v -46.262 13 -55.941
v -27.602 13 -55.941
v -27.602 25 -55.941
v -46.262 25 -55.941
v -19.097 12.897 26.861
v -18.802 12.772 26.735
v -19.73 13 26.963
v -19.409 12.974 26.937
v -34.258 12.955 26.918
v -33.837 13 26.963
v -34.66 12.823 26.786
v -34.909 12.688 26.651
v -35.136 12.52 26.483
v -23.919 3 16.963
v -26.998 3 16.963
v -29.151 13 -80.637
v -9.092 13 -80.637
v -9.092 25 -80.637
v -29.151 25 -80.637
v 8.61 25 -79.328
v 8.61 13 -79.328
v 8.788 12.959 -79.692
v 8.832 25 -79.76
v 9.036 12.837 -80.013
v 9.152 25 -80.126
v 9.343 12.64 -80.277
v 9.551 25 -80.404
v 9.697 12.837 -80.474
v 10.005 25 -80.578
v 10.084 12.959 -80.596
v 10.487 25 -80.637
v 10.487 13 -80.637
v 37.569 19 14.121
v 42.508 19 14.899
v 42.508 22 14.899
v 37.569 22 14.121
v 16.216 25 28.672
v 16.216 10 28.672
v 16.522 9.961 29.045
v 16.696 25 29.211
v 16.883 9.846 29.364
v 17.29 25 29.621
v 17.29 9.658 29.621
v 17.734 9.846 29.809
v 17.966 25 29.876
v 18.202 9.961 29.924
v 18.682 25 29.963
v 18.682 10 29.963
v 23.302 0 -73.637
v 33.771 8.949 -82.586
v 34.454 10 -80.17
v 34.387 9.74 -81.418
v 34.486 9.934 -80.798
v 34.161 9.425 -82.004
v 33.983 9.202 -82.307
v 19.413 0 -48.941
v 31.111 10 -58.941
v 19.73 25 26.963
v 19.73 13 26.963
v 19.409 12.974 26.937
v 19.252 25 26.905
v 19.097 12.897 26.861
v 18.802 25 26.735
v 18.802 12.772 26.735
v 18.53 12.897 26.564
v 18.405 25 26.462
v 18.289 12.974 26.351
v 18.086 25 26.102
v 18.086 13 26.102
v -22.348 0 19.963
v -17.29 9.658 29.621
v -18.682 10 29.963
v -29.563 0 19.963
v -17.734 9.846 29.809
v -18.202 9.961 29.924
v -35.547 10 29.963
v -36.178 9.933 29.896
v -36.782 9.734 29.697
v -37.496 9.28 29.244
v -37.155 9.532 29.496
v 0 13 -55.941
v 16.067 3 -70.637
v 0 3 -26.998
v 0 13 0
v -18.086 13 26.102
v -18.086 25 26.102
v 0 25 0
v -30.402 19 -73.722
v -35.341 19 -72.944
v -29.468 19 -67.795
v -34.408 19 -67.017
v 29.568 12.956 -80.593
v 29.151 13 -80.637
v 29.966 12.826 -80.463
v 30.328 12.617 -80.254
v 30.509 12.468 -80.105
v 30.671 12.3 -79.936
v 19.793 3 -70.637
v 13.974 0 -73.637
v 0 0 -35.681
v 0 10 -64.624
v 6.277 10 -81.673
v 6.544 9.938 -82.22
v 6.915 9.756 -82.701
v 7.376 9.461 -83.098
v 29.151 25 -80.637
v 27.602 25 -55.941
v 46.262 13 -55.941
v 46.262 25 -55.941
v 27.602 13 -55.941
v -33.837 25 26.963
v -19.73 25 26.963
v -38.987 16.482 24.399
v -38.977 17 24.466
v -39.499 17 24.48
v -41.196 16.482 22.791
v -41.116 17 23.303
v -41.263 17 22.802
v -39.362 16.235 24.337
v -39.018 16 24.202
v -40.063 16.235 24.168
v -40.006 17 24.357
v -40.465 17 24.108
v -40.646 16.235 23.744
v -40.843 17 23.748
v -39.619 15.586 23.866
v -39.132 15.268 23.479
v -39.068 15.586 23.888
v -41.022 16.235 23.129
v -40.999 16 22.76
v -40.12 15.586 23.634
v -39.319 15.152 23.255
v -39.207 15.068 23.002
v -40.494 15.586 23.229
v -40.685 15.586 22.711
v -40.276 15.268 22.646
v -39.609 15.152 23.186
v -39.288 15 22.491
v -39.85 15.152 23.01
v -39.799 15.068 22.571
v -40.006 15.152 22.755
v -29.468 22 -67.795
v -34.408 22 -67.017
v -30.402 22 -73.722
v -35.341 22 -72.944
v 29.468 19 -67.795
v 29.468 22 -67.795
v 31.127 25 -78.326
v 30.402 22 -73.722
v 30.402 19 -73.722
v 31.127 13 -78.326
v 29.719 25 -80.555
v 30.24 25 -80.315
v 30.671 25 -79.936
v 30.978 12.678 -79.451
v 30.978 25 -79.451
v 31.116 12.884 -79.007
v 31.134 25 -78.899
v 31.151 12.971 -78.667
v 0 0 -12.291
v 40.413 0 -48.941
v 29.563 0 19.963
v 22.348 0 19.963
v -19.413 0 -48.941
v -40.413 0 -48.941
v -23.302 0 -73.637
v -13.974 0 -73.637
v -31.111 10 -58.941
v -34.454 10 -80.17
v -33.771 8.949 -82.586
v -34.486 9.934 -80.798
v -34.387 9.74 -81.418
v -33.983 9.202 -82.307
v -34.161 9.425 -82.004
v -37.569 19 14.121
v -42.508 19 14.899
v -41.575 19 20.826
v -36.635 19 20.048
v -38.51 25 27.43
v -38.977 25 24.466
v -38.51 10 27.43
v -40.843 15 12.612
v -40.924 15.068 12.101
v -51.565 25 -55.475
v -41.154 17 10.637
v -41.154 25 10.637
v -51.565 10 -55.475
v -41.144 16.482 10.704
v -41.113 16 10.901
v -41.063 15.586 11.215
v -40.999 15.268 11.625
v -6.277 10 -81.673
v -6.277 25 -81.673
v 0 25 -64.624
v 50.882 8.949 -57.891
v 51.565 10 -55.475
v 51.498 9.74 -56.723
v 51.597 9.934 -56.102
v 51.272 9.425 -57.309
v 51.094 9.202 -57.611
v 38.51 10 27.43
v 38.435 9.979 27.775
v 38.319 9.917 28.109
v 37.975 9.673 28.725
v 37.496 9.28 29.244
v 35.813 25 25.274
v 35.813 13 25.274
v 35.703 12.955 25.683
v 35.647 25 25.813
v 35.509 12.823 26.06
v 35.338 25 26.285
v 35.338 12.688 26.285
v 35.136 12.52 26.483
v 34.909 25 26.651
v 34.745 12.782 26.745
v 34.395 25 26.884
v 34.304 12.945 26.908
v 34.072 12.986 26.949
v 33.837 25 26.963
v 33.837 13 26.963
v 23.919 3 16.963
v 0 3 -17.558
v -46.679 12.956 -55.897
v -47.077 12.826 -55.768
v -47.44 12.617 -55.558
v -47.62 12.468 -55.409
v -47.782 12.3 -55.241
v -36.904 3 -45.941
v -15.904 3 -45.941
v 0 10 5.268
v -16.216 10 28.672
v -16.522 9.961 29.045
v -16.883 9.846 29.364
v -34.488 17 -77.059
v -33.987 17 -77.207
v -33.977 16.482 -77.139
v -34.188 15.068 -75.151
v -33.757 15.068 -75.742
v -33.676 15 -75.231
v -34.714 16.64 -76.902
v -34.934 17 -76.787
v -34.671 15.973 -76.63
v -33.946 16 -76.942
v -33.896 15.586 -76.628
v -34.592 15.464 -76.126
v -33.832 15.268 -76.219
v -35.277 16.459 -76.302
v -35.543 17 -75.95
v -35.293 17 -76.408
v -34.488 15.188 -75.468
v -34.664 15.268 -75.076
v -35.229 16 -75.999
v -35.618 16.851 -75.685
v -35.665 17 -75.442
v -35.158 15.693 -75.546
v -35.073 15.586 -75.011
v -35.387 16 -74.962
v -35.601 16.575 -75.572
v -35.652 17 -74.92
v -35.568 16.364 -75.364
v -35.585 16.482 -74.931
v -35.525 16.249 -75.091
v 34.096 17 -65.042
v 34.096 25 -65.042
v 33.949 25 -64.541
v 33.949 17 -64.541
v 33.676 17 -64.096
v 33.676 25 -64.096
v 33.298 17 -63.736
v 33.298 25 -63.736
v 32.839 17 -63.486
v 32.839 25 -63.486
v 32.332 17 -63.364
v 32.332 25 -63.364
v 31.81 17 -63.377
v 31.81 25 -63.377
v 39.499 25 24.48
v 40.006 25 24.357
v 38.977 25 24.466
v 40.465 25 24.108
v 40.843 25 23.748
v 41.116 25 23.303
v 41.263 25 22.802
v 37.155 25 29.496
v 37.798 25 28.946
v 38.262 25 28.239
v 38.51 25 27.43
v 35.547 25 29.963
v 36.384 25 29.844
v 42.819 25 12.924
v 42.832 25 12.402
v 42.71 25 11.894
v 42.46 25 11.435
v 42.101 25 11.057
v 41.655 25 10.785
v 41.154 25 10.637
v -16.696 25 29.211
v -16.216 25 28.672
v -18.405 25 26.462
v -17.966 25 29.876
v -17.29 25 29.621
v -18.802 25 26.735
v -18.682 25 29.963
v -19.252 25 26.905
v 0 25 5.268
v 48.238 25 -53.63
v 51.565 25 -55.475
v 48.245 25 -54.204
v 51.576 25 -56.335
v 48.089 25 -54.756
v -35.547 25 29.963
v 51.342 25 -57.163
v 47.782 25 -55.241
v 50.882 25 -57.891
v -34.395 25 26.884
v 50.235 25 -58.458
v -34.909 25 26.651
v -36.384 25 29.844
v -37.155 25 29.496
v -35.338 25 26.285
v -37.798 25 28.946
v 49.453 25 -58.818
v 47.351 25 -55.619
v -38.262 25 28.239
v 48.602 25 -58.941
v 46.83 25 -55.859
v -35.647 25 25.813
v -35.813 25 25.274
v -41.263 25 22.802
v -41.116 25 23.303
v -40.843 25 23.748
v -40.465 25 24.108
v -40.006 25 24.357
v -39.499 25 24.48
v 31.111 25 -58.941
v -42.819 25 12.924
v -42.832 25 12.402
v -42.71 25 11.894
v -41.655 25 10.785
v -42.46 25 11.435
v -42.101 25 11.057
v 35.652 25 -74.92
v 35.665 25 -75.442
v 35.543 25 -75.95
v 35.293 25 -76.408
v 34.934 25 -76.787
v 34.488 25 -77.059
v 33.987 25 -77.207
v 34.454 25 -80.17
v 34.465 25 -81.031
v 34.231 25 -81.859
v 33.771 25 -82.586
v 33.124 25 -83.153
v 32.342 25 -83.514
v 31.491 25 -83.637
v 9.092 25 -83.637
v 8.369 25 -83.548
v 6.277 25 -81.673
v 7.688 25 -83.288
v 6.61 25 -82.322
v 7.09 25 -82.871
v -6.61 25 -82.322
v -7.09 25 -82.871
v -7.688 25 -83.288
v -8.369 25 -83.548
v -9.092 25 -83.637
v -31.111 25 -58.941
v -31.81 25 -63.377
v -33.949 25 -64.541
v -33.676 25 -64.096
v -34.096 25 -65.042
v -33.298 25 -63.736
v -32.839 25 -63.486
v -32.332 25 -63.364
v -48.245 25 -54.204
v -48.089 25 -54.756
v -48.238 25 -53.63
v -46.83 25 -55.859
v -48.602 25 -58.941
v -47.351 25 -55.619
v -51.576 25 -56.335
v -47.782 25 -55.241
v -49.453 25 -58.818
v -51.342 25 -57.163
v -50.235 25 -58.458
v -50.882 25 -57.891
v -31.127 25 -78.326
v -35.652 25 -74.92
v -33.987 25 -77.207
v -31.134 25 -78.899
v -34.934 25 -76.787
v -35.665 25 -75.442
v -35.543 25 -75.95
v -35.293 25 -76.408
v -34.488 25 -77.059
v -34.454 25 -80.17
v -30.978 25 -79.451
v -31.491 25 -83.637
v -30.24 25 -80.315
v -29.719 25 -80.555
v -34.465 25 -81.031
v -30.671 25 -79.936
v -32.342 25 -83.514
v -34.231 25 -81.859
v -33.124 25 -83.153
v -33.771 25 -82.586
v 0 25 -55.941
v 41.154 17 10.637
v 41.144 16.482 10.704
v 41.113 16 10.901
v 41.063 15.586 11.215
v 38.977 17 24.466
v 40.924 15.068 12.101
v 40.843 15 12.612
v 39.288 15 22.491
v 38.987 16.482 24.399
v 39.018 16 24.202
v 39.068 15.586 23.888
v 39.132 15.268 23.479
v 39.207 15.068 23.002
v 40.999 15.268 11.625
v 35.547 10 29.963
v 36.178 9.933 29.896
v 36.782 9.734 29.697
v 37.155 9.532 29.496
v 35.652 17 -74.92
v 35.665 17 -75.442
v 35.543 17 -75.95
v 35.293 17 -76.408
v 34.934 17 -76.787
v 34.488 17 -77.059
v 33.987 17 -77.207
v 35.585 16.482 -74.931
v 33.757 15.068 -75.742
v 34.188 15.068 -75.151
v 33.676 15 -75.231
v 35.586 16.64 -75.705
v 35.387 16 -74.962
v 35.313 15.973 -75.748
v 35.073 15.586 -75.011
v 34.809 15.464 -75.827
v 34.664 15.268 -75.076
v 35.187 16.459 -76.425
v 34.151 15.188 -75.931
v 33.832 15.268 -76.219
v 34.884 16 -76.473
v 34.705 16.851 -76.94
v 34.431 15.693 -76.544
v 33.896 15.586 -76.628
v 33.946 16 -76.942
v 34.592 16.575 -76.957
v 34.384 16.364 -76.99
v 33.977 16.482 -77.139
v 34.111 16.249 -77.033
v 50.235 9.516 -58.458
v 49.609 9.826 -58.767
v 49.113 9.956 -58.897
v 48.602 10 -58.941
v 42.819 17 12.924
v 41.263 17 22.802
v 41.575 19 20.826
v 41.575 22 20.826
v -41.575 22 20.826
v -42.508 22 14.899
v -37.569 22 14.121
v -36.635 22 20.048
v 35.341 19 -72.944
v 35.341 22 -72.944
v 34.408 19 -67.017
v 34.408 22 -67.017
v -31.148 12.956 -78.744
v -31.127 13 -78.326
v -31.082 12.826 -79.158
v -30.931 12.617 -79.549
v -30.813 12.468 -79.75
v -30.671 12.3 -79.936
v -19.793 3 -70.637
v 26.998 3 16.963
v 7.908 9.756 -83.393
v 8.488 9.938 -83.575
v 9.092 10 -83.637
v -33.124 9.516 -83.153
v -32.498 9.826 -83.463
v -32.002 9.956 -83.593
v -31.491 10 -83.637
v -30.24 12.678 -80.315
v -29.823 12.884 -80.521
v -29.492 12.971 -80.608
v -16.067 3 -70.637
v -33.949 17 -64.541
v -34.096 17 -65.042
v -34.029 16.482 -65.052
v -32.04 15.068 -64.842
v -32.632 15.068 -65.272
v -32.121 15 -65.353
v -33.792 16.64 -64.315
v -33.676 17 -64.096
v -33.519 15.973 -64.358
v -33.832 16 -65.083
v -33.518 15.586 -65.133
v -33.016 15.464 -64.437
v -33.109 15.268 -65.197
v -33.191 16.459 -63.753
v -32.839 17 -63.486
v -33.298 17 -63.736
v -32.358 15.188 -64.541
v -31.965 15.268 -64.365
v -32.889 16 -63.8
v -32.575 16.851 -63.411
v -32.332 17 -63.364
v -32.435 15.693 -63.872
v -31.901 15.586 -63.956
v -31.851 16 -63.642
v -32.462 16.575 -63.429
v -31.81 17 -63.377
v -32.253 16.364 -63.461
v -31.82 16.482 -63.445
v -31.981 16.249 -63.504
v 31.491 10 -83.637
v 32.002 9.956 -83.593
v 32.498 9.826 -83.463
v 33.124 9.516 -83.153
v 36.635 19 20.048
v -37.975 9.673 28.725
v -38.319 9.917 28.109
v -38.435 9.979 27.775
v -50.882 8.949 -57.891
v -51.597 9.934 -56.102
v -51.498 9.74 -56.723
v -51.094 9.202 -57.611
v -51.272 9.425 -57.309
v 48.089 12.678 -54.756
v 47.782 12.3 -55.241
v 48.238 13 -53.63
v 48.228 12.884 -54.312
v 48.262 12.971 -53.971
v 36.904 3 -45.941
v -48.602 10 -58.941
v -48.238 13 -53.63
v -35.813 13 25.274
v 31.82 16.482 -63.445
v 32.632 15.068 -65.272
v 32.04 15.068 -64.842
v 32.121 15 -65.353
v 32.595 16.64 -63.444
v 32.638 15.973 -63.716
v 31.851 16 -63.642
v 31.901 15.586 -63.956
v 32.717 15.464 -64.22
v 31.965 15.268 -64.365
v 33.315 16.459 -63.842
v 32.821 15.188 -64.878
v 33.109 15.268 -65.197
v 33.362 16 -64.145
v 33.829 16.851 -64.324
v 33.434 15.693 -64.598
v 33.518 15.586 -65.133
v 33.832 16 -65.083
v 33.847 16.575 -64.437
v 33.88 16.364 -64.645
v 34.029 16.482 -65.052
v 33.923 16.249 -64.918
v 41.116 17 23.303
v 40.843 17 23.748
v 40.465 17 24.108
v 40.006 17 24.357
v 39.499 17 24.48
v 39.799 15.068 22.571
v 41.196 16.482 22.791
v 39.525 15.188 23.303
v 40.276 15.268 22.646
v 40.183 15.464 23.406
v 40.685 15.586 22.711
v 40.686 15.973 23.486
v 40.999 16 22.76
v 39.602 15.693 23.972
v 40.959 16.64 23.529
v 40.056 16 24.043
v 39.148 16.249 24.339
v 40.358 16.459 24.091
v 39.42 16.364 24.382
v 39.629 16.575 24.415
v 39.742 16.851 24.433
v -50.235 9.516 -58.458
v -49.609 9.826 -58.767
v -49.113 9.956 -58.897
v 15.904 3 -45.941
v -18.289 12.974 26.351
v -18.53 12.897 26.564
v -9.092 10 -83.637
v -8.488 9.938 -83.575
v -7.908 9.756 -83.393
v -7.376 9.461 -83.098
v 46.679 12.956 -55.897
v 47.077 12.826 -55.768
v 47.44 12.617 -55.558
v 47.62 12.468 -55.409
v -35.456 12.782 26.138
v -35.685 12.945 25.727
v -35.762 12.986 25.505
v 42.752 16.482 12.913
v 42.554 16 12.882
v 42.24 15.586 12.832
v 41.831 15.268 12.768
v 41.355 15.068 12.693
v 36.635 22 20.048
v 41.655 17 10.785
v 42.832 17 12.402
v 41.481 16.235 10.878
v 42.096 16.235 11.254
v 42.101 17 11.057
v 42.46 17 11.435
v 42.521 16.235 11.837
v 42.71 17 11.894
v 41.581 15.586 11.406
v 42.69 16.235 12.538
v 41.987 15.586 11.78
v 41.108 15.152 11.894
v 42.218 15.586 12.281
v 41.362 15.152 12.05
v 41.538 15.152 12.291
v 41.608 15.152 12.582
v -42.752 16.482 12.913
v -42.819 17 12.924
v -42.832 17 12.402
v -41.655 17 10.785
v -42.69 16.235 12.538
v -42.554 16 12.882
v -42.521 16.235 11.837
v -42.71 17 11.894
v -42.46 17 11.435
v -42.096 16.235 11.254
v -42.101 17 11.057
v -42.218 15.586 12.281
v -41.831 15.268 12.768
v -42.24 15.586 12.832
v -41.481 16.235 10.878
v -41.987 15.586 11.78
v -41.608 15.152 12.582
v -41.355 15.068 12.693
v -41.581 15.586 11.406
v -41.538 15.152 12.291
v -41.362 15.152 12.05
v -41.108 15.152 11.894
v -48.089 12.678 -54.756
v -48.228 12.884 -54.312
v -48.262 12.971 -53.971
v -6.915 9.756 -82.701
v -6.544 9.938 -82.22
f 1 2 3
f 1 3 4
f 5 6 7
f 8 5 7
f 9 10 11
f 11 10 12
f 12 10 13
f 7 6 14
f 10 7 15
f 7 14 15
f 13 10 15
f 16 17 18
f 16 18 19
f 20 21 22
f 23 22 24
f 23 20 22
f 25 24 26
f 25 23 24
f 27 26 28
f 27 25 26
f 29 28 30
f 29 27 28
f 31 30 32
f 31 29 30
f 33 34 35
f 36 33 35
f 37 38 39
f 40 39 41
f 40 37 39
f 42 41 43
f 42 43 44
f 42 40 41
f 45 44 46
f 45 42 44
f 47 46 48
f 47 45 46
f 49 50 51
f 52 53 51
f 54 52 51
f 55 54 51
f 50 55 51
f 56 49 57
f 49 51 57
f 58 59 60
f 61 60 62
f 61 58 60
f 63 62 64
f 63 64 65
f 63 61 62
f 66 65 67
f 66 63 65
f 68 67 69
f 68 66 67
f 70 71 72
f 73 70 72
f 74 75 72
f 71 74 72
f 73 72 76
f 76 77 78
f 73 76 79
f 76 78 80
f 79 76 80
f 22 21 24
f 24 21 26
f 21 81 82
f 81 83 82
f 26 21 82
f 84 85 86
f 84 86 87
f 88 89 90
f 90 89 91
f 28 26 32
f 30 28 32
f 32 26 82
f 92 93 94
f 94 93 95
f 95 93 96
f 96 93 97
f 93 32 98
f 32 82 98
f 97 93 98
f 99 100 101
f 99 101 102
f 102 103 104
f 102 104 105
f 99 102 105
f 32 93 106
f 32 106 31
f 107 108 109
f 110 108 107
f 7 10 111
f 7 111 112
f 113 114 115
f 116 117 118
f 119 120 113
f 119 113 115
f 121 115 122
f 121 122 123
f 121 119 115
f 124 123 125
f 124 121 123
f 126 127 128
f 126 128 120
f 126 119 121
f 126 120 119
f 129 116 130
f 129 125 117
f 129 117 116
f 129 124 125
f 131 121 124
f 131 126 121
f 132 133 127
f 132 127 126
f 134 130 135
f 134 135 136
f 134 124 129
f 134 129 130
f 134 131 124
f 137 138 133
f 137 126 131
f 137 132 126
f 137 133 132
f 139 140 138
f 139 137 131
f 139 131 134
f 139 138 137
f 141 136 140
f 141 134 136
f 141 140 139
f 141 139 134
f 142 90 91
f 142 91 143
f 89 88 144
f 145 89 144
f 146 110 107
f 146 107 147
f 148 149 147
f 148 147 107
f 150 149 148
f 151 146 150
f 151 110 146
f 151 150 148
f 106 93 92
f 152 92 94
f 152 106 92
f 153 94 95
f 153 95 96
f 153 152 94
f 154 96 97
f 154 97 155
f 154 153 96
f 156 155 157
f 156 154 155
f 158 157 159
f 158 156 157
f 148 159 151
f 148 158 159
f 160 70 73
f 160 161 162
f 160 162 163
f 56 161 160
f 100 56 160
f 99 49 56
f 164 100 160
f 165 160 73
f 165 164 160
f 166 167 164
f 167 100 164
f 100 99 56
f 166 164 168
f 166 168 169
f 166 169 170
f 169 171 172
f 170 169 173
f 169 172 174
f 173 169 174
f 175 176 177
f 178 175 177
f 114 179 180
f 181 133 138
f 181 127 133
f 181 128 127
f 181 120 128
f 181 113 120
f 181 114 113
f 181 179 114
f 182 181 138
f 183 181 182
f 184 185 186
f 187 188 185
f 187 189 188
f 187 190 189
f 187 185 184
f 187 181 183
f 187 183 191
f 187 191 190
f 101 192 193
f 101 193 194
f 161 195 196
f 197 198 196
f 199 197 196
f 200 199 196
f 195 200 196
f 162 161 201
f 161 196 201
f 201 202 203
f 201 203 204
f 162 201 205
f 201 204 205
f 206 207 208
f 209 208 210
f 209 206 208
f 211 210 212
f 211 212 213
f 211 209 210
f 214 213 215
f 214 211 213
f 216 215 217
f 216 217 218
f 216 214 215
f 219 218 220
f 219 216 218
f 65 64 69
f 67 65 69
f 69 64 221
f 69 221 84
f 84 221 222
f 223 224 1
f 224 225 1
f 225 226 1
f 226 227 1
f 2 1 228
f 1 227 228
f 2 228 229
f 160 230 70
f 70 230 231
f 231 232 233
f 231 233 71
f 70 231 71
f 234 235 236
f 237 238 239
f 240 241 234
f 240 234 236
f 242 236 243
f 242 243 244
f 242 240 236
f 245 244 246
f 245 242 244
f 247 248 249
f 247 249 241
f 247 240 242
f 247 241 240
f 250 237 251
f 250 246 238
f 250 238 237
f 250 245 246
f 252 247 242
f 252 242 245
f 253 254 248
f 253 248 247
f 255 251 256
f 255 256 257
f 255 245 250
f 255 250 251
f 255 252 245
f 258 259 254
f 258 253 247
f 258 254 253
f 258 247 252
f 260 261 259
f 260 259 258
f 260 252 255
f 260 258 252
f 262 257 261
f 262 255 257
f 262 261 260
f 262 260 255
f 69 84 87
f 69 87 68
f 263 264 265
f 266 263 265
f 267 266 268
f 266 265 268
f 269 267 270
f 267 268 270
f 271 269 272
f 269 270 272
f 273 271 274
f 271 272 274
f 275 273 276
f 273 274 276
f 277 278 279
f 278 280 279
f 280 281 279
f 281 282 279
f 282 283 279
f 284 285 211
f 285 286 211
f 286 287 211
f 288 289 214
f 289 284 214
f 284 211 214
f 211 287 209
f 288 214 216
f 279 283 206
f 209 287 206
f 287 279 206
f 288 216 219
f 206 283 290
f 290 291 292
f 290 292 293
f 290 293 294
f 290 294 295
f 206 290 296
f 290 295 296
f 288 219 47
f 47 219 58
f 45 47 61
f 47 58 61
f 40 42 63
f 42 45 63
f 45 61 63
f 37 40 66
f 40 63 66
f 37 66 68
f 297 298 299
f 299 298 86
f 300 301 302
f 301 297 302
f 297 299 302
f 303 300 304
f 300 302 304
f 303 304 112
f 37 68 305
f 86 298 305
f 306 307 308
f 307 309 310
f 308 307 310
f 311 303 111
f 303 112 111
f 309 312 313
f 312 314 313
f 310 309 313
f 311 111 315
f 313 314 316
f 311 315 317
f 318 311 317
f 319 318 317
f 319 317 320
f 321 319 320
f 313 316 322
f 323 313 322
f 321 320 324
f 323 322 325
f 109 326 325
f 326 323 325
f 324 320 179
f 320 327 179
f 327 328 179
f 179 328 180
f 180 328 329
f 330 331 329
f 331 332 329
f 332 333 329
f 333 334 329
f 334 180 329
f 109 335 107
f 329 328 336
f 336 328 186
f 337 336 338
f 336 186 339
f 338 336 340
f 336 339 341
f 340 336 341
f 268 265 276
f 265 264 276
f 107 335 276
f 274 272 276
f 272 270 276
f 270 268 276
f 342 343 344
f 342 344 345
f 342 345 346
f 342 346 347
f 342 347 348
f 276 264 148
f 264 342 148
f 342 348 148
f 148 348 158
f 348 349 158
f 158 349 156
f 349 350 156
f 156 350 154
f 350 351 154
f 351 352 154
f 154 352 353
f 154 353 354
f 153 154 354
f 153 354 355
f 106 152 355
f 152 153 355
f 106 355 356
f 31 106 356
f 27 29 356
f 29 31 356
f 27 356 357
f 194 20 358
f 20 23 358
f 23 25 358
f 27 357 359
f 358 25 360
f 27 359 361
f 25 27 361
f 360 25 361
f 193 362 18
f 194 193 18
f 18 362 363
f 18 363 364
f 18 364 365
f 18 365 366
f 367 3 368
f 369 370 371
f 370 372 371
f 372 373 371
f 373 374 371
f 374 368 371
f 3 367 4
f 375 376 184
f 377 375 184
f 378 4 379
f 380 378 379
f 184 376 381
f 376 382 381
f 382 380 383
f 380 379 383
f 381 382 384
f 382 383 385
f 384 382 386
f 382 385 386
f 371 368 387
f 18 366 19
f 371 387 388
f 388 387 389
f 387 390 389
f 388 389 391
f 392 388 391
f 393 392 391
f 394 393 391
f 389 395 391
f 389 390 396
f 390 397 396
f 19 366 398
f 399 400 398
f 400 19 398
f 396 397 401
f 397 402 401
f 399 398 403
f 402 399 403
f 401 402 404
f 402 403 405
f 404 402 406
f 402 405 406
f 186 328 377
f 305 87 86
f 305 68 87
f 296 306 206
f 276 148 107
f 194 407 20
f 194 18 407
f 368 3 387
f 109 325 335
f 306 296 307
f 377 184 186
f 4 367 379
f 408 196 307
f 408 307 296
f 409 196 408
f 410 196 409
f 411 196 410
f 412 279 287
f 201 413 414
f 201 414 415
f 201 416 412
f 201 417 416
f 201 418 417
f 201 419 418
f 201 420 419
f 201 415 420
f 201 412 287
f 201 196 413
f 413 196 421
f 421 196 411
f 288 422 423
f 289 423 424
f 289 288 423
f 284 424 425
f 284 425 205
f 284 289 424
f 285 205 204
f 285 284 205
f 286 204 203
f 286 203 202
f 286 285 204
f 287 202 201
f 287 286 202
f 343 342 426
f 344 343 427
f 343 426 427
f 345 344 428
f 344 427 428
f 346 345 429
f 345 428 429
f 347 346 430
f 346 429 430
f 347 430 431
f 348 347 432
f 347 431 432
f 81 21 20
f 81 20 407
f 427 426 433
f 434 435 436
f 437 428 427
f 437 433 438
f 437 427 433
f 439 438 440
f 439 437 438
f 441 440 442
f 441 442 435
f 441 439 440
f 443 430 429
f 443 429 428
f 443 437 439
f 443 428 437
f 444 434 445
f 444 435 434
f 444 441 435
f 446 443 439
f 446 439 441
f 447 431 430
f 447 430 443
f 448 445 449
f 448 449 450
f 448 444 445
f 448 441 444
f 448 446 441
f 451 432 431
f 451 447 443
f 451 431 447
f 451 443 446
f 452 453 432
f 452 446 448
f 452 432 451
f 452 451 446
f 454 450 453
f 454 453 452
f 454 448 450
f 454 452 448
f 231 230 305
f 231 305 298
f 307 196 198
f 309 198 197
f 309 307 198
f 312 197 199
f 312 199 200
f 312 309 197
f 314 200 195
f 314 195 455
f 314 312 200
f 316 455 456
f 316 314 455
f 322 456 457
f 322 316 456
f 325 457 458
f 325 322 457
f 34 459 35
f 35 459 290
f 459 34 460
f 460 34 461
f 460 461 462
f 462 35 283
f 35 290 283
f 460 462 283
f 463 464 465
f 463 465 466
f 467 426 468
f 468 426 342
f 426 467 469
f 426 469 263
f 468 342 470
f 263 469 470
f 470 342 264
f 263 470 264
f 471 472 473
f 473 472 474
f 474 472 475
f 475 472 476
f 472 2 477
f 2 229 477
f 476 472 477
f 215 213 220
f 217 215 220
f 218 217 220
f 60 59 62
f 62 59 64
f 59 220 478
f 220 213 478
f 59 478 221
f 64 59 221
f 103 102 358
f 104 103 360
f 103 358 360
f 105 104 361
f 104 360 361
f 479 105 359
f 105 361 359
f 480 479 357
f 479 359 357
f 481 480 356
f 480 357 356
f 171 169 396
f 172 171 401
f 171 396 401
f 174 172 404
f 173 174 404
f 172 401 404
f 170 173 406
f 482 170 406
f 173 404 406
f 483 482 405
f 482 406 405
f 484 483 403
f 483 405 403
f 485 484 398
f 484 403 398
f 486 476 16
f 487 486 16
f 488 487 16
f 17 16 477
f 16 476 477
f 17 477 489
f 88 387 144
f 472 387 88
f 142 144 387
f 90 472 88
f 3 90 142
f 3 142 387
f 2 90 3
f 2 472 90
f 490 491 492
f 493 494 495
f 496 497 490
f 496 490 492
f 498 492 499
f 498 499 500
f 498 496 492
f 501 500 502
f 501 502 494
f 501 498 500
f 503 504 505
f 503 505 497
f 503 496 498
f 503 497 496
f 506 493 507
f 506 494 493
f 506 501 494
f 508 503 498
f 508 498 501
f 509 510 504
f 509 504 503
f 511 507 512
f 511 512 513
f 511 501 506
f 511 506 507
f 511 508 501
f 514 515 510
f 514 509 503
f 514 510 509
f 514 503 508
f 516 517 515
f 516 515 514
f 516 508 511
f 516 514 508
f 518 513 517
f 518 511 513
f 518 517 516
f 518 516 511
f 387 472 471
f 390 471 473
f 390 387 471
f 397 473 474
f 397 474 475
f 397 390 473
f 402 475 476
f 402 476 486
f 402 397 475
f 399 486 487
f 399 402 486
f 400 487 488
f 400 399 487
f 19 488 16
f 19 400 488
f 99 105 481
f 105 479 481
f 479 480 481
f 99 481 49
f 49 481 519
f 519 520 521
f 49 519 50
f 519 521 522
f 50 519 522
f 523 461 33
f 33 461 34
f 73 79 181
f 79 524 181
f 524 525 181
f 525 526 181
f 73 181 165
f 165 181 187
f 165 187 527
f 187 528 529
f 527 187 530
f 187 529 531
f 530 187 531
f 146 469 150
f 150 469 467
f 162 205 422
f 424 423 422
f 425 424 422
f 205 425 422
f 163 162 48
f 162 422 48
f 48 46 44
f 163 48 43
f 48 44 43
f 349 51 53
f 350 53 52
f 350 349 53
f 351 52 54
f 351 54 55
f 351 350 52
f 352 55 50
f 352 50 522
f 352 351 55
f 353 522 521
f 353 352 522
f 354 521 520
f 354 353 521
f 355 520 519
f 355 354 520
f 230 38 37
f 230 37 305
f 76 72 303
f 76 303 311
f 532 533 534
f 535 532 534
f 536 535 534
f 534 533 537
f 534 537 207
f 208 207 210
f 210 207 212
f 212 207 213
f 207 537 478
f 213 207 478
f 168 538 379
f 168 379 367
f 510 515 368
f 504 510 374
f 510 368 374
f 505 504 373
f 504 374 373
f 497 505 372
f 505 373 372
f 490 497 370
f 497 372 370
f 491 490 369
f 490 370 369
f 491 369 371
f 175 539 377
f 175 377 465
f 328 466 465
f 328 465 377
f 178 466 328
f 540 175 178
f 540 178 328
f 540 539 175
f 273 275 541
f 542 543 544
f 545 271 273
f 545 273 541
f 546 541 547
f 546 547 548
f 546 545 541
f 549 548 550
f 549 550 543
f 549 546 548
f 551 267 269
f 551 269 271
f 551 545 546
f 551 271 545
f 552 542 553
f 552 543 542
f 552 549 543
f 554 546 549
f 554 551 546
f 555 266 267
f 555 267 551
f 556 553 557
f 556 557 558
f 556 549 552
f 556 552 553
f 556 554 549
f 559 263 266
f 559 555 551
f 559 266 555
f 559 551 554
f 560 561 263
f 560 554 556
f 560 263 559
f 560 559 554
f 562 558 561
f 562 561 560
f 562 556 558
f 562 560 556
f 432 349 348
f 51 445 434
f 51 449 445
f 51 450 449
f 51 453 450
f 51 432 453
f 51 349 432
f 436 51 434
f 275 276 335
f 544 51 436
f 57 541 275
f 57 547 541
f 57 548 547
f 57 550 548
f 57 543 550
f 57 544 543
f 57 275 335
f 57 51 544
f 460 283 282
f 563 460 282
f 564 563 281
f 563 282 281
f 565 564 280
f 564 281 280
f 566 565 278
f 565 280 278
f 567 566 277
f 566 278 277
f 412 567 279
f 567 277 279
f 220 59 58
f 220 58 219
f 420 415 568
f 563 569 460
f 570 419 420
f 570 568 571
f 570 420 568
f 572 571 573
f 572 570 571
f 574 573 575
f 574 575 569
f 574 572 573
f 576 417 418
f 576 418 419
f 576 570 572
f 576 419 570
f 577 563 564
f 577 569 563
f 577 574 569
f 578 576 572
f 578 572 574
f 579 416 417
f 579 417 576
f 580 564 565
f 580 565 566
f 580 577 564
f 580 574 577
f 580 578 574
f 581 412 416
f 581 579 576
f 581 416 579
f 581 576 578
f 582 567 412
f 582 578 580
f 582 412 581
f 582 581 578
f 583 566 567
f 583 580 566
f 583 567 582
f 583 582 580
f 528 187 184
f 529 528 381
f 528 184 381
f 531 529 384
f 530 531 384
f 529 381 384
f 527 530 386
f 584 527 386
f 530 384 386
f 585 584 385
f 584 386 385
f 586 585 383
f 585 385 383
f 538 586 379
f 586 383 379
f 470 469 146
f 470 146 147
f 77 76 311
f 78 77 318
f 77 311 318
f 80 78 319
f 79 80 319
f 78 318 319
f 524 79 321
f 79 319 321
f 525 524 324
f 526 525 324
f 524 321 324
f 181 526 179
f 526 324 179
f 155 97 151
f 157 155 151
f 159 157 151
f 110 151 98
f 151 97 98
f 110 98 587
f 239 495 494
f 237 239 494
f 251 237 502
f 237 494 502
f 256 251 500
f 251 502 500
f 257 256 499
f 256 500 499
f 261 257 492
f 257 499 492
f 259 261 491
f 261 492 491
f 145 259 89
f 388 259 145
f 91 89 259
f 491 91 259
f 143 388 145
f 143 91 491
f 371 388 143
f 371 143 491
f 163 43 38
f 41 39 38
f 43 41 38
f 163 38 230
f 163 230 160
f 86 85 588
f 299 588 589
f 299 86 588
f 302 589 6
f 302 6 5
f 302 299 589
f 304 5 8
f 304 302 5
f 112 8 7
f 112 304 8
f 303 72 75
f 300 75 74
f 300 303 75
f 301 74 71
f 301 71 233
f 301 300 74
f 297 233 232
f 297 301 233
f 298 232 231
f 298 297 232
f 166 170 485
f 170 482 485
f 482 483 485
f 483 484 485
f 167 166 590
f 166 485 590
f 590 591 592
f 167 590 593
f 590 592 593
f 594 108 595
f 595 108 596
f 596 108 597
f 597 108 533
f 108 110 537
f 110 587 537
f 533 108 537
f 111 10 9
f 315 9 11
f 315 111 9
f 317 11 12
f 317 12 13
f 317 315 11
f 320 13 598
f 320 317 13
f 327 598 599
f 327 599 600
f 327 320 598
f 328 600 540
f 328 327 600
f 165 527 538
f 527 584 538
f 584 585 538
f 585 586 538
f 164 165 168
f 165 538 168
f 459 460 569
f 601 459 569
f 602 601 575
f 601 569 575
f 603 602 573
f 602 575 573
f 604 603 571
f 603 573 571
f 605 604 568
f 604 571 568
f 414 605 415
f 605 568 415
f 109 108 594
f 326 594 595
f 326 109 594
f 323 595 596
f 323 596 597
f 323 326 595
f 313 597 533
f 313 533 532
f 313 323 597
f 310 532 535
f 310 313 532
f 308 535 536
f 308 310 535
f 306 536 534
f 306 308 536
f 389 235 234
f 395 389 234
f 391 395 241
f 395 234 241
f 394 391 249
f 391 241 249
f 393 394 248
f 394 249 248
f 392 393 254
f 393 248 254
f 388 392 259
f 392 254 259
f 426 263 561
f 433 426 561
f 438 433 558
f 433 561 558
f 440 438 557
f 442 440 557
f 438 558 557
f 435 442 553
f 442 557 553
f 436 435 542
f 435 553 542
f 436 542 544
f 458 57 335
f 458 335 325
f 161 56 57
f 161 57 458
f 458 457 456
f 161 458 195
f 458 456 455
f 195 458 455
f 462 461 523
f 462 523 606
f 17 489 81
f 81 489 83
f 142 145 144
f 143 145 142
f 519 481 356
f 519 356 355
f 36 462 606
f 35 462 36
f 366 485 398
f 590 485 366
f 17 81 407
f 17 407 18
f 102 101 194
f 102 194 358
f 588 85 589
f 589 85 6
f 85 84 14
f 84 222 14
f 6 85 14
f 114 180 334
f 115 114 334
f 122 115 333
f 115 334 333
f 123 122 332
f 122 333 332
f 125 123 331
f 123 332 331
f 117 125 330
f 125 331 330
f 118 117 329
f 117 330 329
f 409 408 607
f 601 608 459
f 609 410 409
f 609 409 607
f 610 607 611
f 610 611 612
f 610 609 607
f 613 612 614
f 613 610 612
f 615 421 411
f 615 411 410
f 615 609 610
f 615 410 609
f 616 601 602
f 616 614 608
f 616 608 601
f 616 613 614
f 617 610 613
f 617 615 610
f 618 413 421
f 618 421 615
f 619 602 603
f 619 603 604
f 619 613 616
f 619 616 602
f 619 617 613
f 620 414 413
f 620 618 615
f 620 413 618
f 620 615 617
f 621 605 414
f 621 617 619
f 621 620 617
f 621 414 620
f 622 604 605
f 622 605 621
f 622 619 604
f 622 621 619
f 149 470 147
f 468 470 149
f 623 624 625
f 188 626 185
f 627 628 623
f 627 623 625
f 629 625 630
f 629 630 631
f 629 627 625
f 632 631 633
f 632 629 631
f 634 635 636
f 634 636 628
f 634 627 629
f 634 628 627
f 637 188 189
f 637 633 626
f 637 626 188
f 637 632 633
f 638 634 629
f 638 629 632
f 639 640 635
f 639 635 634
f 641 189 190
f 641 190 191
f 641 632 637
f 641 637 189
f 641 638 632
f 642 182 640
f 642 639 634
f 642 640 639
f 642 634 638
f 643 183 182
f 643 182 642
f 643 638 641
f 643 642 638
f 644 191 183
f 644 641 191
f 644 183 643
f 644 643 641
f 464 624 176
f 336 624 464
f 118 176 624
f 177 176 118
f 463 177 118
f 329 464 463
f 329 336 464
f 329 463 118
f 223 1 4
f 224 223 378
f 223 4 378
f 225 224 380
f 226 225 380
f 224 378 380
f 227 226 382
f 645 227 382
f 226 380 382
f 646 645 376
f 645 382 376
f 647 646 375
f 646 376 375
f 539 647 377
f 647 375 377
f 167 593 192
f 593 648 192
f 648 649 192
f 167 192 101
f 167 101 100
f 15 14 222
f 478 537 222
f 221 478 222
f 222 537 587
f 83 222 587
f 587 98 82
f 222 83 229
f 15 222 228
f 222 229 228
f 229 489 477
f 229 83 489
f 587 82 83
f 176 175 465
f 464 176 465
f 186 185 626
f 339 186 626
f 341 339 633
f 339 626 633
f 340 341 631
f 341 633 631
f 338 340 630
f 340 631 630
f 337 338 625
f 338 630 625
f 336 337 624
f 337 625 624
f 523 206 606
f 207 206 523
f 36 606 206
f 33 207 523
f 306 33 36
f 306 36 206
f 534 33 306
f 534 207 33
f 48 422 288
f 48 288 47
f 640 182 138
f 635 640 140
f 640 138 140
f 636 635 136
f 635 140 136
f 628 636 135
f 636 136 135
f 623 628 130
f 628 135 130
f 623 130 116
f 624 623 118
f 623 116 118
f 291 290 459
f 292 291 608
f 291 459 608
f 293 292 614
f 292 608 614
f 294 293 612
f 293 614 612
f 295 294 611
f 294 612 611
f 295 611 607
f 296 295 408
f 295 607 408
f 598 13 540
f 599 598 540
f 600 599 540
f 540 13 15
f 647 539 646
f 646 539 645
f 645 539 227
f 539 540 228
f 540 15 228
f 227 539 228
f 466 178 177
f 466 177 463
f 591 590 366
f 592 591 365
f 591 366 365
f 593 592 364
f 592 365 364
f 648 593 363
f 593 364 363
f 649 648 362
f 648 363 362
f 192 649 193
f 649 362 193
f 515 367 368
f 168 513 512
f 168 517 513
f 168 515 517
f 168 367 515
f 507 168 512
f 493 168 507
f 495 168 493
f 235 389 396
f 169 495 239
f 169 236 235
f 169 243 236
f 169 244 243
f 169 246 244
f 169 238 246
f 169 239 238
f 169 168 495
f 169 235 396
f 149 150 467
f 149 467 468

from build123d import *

# Parameters (mm, degrees)
BOSS_EXTRUDE2_DEPTH = 25
BOSS_EXTRUDE5_DEPTH = 3
CHAMFER2_SIZE       = 10
FILLET4_R           = 3
FILLET5_R           = 2
SKETCH5_W           = 14
SKETCH5_H           = 10
BOSS_EXTRUDE6_DEPTH = 2
SKETCH6_W           = 6
SKETCH6_H           = 3
CUT_EXTRUDE5_DEPTH  = 5
SKETCH7_W           = 14
SKETCH7_H           = 10
BOSS_EXTRUDE7_DEPTH = 2
SKETCH8_W           = 6
SKETCH8_H           = 3
CUT_EXTRUDE6_DEPTH  = 5
SKETCH9_W           = 6
SKETCH9_H           = 3
CUT_EXTRUDE7_DEPTH  = 5
SKETCH10_W          = 6
SKETCH10_H          = 3
CUT_EXTRUDE8_DEPTH  = 5
FILLET7_R           = 2


with BuildPart() as part:
    # Sketch1 → Boss-Extrude2 (new body)
    with BuildSketch(Plane(origin=(0, 0, 0), x_dir=(1, 0, 0), z_dir=(0, 1, 0))):
        Polygon((-35, 83.63691638), (-7, 83.63691638), (0, 64.624244097), (7, 83.63691638), (35, 83.63691638), (31.111111111, 58.941237745), (52.111111111, 58.941237745), (38.111111111, -29.963205338), (17.111111111, -29.963205338), (0, -5.267526704), (-17.111111111, -29.963205338), (-38.111111111, -29.963205338), (-52.111111111, 58.941237745), (-31.111111111, 58.941237745), align=None)
        Polygon((-48.6017252, 55.941237745), (-35.546559868, -26.963205338), (-18.682232195, -26.963205338), (0, 0), (18.682232195, -26.963205338), (35.546559868, -26.963205338), (48.6017252, 55.941237745), (27.6017252, 55.941237745), (31.490614089, 80.63691638), (9.092343668, 80.63691638), (0, 55.941237745), (-9.092343668, 80.63691638), (-31.490614089, 80.63691638), (-27.6017252, 55.941237745), align=None, mode=Mode.SUBTRACT)
    extrude(amount=BOSS_EXTRUDE2_DEPTH)

    # Sketch1<7> → Boss-Extrude5 (add)
    with BuildSketch(Plane(origin=(0, 0, 0), x_dir=(1, 0, 0), z_dir=(0, 1, 0))):
        Polygon((0, 55.941237745), (9.092343668, 80.63691638), (31.490614089, 80.63691638), (27.6017252, 55.941237745), (48.6017252, 55.941237745), (35.546559868, -26.963205338), (18.682232195, -26.963205338), (0, 0), (-18.682232195, -26.963205338), (-35.546559868, -26.963205338), (-48.6017252, 55.941237745), (-27.6017252, 55.941237745), (-31.490614089, 80.63691638), (-9.092343668, 80.63691638), align=None)
    extrude(amount=BOSS_EXTRUDE5_DEPTH)

    # Chamfer2
    chamfer2_edges = [part.edges().sort_by_distance(p)[0] for p in [
        (9.341116097, 3, 13.481602669),
        (27.114396032, 3, 26.963205338),
        (42.074142534, 3, -14.489016203),
        (38.1017252, 3, -55.941237745),
        (29.546169644, 3, -68.289077062),
        (20.291478878, 3, -80.63691638),
        (-4.546171834, 3, -68.289077062),
        (-20.291478878, 3, -80.63691638),
        (-29.546169644, 3, -68.289077062),
        (-38.1017252, 3, -55.941237745),
        (-42.074142534, 3, -14.489016203),
        (-27.114396032, 3, 26.963205338),
        (-9.341116097, 3, 13.481602669),
        (-27.611111111, 0, 29.963205338),
        (-45.111111111, 0, -14.489016203),
        (-41.611111111, 0, -58.941237745),
        (-33.055555556, 0, -71.289077062),
        (-21, 0, -83.63691638),
        (-3.5, 0, -74.130580238),
        (3.5, 0, -74.130580238),
        (21, 0, -83.63691638),
        (33.055555556, 0, -71.289077062),
        (41.611111111, 0, -58.941237745),
        (45.111111111, 0, -14.489016203),
        (27.611111111, 0, 29.963205338),
        (8.555555556, 0, 17.615366021),
        (-8.555555556, 0, 17.615366021),
        (4.546171834, 3, -68.289077062),
    ]]
    chamfer(chamfer2_edges, length=CHAMFER2_SIZE)

    # Fillet4
    fillet4_edges = [part.edges().sort_by_distance(p)[0] for p in [
        (-17.111111111, 17.5, 29.963205338),
        (-38.111111111, 17.5, 29.963205338),
        (-52.111111111, 17.5, -58.941237745),
        (-35, 17.5, -83.63691638),
        (-7, 17.5, -83.63691638),
        (7, 17.5, -83.63691638),
        (35, 17.5, -83.63691638),
        (52.111111111, 17.5, -58.941237745),
        (38.111111111, 17.5, 29.963205338),
        (17.111111111, 17.5, 29.963205338),
    ]]
    fillet(fillet4_edges, radius=FILLET4_R)

    # Fillet5
    fillet5_edges = [part.edges().sort_by_distance(p)[0] for p in [
        (-31.490614089, 19, -80.63691638),
        (-48.6017252, 19, -55.941237745),
        (-35.546559868, 19, 26.963205338),
        (-18.682232195, 19, 26.963205338),
        (18.682232195, 19, 26.963205338),
        (35.546559868, 19, 26.963205338),
        (48.6017252, 19, -55.941237745),
        (31.490614089, 19, -80.63691638),
        (9.092343668, 19, -80.63691638),
    ]]
    fillet(fillet5_edges, radius=FILLET5_R)

    # Sketch5 → Boss-Extrude6 (add)
    with BuildSketch(Plane(origin=(-21.301270542, 0, 3.354363148), x_dir=(0.15555555555555572, 0, 0.9878271453730164), z_dir=(-0.9878271453730165, 0, 0.15555555555555575))):
        with Locations((-74.553874888, 20)):
            Rectangle(SKETCH5_W, SKETCH5_H)
    boss_extrude6 = extrude(amount=BOSS_EXTRUDE6_DEPTH)

    # Sketch6 → Cut-Extrude5 (cut)
    with BuildSketch(Plane(origin=(-23.276924833, 0, 3.665474259), x_dir=(0.15555555555555592, 0, 0.9878271453730164), z_dir=(-0.9878271453730163, 0, 0.1555555555555559))):
        with Locations((-74.553874888, 20.5)):
            Rectangle(SKETCH6_W, SKETCH6_H)
    extrude(amount=-CUT_EXTRUDE5_DEPTH, mode=Mode.SUBTRACT)

    # Sketch7 → Boss-Extrude7 (add)
    with BuildSketch(Plane(origin=(-41.793122394, 0, 6.581265156), x_dir=(0.15555555555555553, 0, 0.9878271453730164), z_dir=(-0.9878271453730164, 0, 0.15555555555555553))):
        with Locations((11.105521291, 20)):
            Rectangle(SKETCH7_W, SKETCH7_H)
    boss_extrude7 = extrude(amount=BOSS_EXTRUDE7_DEPTH)

    # Sketch8 → Cut-Extrude6 (cut)
    with BuildSketch(Plane(origin=(-43.768776685, 0, 6.892376268), x_dir=(0.15555555555555564, 0, 0.9878271453730164), z_dir=(-0.9878271453730164, 0, 0.15555555555555564))):
        with Locations((11.105521291, 20.5)):
            Rectangle(SKETCH8_W, SKETCH8_H)
    extrude(amount=-CUT_EXTRUDE6_DEPTH, mode=Mode.SUBTRACT)

    # Mirror1: Boss-Extrude6, Boss-Extrude7 across plane
    add(boss_extrude6.mirror(Plane.ZY))
    add(boss_extrude7.mirror(Plane.ZY))

    # Sketch9 → Cut-Extrude7 (cut)
    with BuildSketch(Plane(origin=(43.768776685, 0, 6.892376268), x_dir=(0.1555555555555552, 0, -0.9878271453730165), z_dir=(0.9878271453730165, 0, 0.1555555555555552))):
        with Locations((-11.105521291, 20.5)):
            Rectangle(SKETCH9_W, SKETCH9_H)
    extrude(amount=-CUT_EXTRUDE7_DEPTH, mode=Mode.SUBTRACT)

    # Sketch10 → Cut-Extrude8 (cut)
    with BuildSketch(Plane(origin=(23.276924833, 0, 3.665474259), x_dir=(0.15555555555555514, 0, -0.9878271453730165), z_dir=(0.9878271453730165, 0, 0.15555555555555514))):
        with Locations((74.553874888, 20.5)):
            Rectangle(SKETCH10_W, SKETCH10_H)
    extrude(amount=-CUT_EXTRUDE8_DEPTH, mode=Mode.SUBTRACT)

    # Fillet7
    # the kernel refuses this fillet: 2 mm, written as the material it takes off along each edge
    with BuildSketch(Plane(origin=(-33.676317747, 17, -75.231113986), x_dir=(-0.15555555555555575, 0, -0.9878271453730165), z_dir=(-0.9878271453730165, 0, 0.15555555555555575))) as fillet7_piece_1_section:
        Polygon((0, 0), (FILLET7_R * 1.02, 0), (FILLET7_R * 1.02, FILLET7_R * 1.02), (0, FILLET7_R * 1.02), align=None)
    fillet7_piece_1 = extrude(amount=FILLET7_R * 1.02, mode=Mode.PRIVATE)
    fillet7_piece_1 = fillet7_piece_1 - Plane(origin=(-33.676317747, 17, -75.231113986), x_dir=(0.10999438818457417, 0.7071067811865475, 0.6984992731334093), z_dir=(-0.9878271453730165, 0, 0.15555555555555575)) * Sphere(FILLET7_R, mode=Mode.PRIVATE)
    add(fillet7_piece_1, mode=Mode.SUBTRACT)
    with BuildSketch(Plane(origin=(-32.120762192, 17, -65.352842532), x_dir=(-0.9878271453730165, 0, 0.15555555555555575), z_dir=(0.15555555555555575, 0, 0.9878271453730165))) as fillet7_piece_2_section:
        Polygon((0, 0), (FILLET7_R * 1.02, 0), (FILLET7_R * 1.02, FILLET7_R * 1.02), (0, FILLET7_R * 1.02), align=None)
    fillet7_piece_2 = extrude(amount=FILLET7_R * 1.02, mode=Mode.PRIVATE)
    fillet7_piece_2 = fillet7_piece_2 - Plane(origin=(-32.120762192, 17, -65.352842532), x_dir=(0.6984992731334094, 0.7071067811865475, -0.10999438818457428), z_dir=(0.15555555555555575, 0, 0.9878271453730165)) * Sphere(FILLET7_R, mode=Mode.PRIVATE)
    add(fillet7_piece_2, mode=Mode.SUBTRACT)
    with BuildSketch(Plane(origin=(-40.843374638, 17, 12.612464824), x_dir=(-0.9878271453730164, 0, 0.15555555555555553), z_dir=(0, -1, 0))) as fillet7_piece_3_section:
        Polygon((0, 0), (FILLET7_R * 1.02, 0), (FILLET7_R * 1.02, FILLET7_R * 1.02), (0, FILLET7_R * 1.02), align=None)
    fillet7_piece_3 = extrude(amount=FILLET7_R * 1.02, mode=Mode.PRIVATE)
    fillet7_piece_3 = fillet7_piece_3 - Plane(origin=(-40.843374638, 17, 12.612464824), x_dir=(0.8084936613179834, 0, 0.5885048849488352), z_dir=(0, -1, 0)) * Sphere(FILLET7_R, mode=Mode.PRIVATE)
    add(fillet7_piece_3, mode=Mode.SUBTRACT)
    with BuildSketch(Plane(origin=(-39.287819082, 17, 22.490736278), x_dir=(0.15555555555555553, 0, 0.9878271453730164), z_dir=(0, -1, 0))) as fillet7_piece_4_section:
        Polygon((0, 0), (FILLET7_R * 1.02, 0), (FILLET7_R * 1.02, FILLET7_R * 1.02), (0, FILLET7_R * 1.02), align=None)
    fillet7_piece_4 = extrude(amount=FILLET7_R * 1.02, mode=Mode.PRIVATE)
    fillet7_piece_4 = fillet7_piece_4 - Plane(origin=(-39.287819082, 17, 22.490736278), x_dir=(0.5885048849488352, 0, -0.8084936613179834), z_dir=(0, -1, 0)) * Sphere(FILLET7_R, mode=Mode.PRIVATE)
    add(fillet7_piece_4, mode=Mode.SUBTRACT)
    with BuildSketch(Plane(origin=(33.676317747, 17, -75.231113986), x_dir=(0.9878271453730165, 0, 0.15555555555555534), z_dir=(0.15555555555555534, 0, -0.9878271453730164))) as fillet7_piece_5_section:
        Polygon((0, 0), (FILLET7_R * 1.02, 0), (FILLET7_R * 1.02, FILLET7_R * 1.02), (0, FILLET7_R * 1.02), align=None)
    fillet7_piece_5 = extrude(amount=FILLET7_R * 1.02, mode=Mode.PRIVATE)
    fillet7_piece_5 = fillet7_piece_5 - Plane(origin=(33.676317747, 17, -75.231113986), x_dir=(-0.6984992731334094, 0.7071067811865475, -0.109994388184574), z_dir=(0.15555555555555534, 0, -0.9878271453730164)) * Sphere(FILLET7_R, mode=Mode.PRIVATE)
    add(fillet7_piece_5, mode=Mode.SUBTRACT)
    with BuildSketch(Plane(origin=(32.120762192, 17, -65.352842532), x_dir=(-0.15555555555555534, 0, 0.9878271453730164), z_dir=(0.9878271453730165, 0, 0.15555555555555534))) as fillet7_piece_6_section:
        Polygon((0, 0), (FILLET7_R * 1.02, 0), (FILLET7_R * 1.02, FILLET7_R * 1.02), (0, FILLET7_R * 1.02), align=None)
    fillet7_piece_6 = extrude(amount=FILLET7_R * 1.02, mode=Mode.PRIVATE)
    fillet7_piece_6 = fillet7_piece_6 - Plane(origin=(32.120762192, 17, -65.352842532), x_dir=(0.10999438818457391, 0.7071067811865475, -0.6984992731334094), z_dir=(0.9878271453730165, 0, 0.15555555555555534)) * Sphere(FILLET7_R, mode=Mode.PRIVATE)
    add(fillet7_piece_6, mode=Mode.SUBTRACT)
    with BuildSketch(Plane(origin=(40.843374638, 17, 12.612464824), x_dir=(0.15555555555555514, 0, -0.9878271453730165), z_dir=(0, -1, 0))) as fillet7_piece_7_section:
        Polygon((0, 0), (FILLET7_R * 1.02, 0), (FILLET7_R * 1.02, FILLET7_R * 1.02), (0, FILLET7_R * 1.02), align=None)
    fillet7_piece_7 = extrude(amount=FILLET7_R * 1.02, mode=Mode.PRIVATE)
    fillet7_piece_7 = fillet7_piece_7 - Plane(origin=(40.843374638, 17, 12.612464824), x_dir=(-0.8084936613179833, 0, 0.5885048849488356), z_dir=(0, -1, 0)) * Sphere(FILLET7_R, mode=Mode.PRIVATE)
    add(fillet7_piece_7, mode=Mode.SUBTRACT)
    with BuildSketch(Plane(origin=(39.287819082, 17, 22.490736278), x_dir=(0, -1, 0), z_dir=(-0.15555555555555514, 0, 0.9878271453730165))) as fillet7_piece_8_section:
        Polygon((0, 0), (FILLET7_R * 1.02, 0), (FILLET7_R * 1.02, FILLET7_R * 1.02), (0, FILLET7_R * 1.02), align=None)
    fillet7_piece_8 = extrude(amount=FILLET7_R * 1.02, mode=Mode.PRIVATE)
    fillet7_piece_8 = fillet7_piece_8 - Plane(origin=(39.287819082, 17, 22.490736278), x_dir=(-0.6984992731334094, 0.7071067811865475, -0.1099943881845739), z_dir=(-0.15555555555555514, 0, 0.9878271453730165)) * Sphere(FILLET7_R, mode=Mode.PRIVATE)
    add(fillet7_piece_8, mode=Mode.SUBTRACT)
    with BuildSketch(Plane(origin=(-35.963083149, 17, -76.895657166), x_dir=(0.15555555555555936, 0, 0.9878271453730157), z_dir=(0, 1, 0)), Plane(origin=(-43.13014004, 17, 10.947921645), x_dir=(0.15555555555555506, 0, 0.9878271453730165), z_dir=(0, 1, 0)), Plane(origin=(35.963083149, 17, -76.895657166), x_dir=(-0.9878271453730183, 0, -0.15555555555554387), z_dir=(0, 1, 0)), Plane(origin=(43.13014004, 17, 10.947921645), x_dir=(-0.9878271453730165, 0, -0.1555555555555548), z_dir=(0, 1, 0))) as fillet7_piece_9:
        with BuildLine():
            CenterArc((FILLET7_R, FILLET7_R), FILLET7_R, 180, 90)
            Line((0, FILLET7_R), (0, 0))
            Line((0, 0), (FILLET7_R, 0))
        make_face()
    extrude(amount=13, mode=Mode.SUBTRACT)
    with BuildSketch(Plane(origin=(-34.096416482, 15, -65.041731421), x_dir=(0, 1, 0), z_dir=(-0.15555555555555575, 0, -0.9878271453730165)), Plane(origin=(-41.263473373, 15, 22.801847389), x_dir=(0, 1, 0), z_dir=(-0.15555555555555553, 0, -0.9878271453730164))) as fillet7_piece_10:
        with BuildLine():
            CenterArc((FILLET7_R, FILLET7_R), FILLET7_R, 180, 90)
            Line((0, FILLET7_R), (0, 0))
            Line((0, 0), (FILLET7_R, 0))
        make_face()
    extrude(amount=10, mode=Mode.SUBTRACT)
    with BuildSketch(Plane(origin=(-33.785305371, 30, -63.06607713), x_dir=(0.9878271453730171, 0, -0.15555555555555162), z_dir=(0, -1, 0)), Plane(origin=(-40.952362262, 30, 24.77750168), x_dir=(0.9878271453730165, 0, -0.1555555555555548), z_dir=(0, -1, 0)), Plane(origin=(33.785305371, 30, -63.06607713), x_dir=(0.1555555555555548, 0, -0.9878271453730165), z_dir=(0, -1, 0)), Plane(origin=(40.952362262, 30, 24.77750168), x_dir=(0.15555555555555506, 0, -0.9878271453730165), z_dir=(0, -1, 0))) as fillet7_piece_11:
        with BuildLine():
            CenterArc((FILLET7_R, -FILLET7_R), FILLET7_R, 90, 90)
            Line((0, -FILLET7_R), (0, 0))
            Line((0, 0), (FILLET7_R, 0))
        make_face()
    extrude(amount=13, mode=Mode.SUBTRACT)
    with BuildSketch(Plane(origin=(34.096416482, 15, -65.041731421), x_dir=(0, 1, 0), z_dir=(0.15555555555555534, 0, -0.9878271453730165)), Plane(origin=(41.263473373, 15, 22.801847389), x_dir=(0, 1, 0), z_dir=(0.1555555555555552, 0, -0.9878271453730165))) as fillet7_piece_12:
        with BuildLine():
            CenterArc((FILLET7_R, -FILLET7_R), FILLET7_R, 90, 90)
            Line((0, -FILLET7_R), (0, 0))
            Line((0, 0), (FILLET7_R, 0))
        make_face()
    extrude(amount=10, mode=Mode.SUBTRACT)


solid = part.part
